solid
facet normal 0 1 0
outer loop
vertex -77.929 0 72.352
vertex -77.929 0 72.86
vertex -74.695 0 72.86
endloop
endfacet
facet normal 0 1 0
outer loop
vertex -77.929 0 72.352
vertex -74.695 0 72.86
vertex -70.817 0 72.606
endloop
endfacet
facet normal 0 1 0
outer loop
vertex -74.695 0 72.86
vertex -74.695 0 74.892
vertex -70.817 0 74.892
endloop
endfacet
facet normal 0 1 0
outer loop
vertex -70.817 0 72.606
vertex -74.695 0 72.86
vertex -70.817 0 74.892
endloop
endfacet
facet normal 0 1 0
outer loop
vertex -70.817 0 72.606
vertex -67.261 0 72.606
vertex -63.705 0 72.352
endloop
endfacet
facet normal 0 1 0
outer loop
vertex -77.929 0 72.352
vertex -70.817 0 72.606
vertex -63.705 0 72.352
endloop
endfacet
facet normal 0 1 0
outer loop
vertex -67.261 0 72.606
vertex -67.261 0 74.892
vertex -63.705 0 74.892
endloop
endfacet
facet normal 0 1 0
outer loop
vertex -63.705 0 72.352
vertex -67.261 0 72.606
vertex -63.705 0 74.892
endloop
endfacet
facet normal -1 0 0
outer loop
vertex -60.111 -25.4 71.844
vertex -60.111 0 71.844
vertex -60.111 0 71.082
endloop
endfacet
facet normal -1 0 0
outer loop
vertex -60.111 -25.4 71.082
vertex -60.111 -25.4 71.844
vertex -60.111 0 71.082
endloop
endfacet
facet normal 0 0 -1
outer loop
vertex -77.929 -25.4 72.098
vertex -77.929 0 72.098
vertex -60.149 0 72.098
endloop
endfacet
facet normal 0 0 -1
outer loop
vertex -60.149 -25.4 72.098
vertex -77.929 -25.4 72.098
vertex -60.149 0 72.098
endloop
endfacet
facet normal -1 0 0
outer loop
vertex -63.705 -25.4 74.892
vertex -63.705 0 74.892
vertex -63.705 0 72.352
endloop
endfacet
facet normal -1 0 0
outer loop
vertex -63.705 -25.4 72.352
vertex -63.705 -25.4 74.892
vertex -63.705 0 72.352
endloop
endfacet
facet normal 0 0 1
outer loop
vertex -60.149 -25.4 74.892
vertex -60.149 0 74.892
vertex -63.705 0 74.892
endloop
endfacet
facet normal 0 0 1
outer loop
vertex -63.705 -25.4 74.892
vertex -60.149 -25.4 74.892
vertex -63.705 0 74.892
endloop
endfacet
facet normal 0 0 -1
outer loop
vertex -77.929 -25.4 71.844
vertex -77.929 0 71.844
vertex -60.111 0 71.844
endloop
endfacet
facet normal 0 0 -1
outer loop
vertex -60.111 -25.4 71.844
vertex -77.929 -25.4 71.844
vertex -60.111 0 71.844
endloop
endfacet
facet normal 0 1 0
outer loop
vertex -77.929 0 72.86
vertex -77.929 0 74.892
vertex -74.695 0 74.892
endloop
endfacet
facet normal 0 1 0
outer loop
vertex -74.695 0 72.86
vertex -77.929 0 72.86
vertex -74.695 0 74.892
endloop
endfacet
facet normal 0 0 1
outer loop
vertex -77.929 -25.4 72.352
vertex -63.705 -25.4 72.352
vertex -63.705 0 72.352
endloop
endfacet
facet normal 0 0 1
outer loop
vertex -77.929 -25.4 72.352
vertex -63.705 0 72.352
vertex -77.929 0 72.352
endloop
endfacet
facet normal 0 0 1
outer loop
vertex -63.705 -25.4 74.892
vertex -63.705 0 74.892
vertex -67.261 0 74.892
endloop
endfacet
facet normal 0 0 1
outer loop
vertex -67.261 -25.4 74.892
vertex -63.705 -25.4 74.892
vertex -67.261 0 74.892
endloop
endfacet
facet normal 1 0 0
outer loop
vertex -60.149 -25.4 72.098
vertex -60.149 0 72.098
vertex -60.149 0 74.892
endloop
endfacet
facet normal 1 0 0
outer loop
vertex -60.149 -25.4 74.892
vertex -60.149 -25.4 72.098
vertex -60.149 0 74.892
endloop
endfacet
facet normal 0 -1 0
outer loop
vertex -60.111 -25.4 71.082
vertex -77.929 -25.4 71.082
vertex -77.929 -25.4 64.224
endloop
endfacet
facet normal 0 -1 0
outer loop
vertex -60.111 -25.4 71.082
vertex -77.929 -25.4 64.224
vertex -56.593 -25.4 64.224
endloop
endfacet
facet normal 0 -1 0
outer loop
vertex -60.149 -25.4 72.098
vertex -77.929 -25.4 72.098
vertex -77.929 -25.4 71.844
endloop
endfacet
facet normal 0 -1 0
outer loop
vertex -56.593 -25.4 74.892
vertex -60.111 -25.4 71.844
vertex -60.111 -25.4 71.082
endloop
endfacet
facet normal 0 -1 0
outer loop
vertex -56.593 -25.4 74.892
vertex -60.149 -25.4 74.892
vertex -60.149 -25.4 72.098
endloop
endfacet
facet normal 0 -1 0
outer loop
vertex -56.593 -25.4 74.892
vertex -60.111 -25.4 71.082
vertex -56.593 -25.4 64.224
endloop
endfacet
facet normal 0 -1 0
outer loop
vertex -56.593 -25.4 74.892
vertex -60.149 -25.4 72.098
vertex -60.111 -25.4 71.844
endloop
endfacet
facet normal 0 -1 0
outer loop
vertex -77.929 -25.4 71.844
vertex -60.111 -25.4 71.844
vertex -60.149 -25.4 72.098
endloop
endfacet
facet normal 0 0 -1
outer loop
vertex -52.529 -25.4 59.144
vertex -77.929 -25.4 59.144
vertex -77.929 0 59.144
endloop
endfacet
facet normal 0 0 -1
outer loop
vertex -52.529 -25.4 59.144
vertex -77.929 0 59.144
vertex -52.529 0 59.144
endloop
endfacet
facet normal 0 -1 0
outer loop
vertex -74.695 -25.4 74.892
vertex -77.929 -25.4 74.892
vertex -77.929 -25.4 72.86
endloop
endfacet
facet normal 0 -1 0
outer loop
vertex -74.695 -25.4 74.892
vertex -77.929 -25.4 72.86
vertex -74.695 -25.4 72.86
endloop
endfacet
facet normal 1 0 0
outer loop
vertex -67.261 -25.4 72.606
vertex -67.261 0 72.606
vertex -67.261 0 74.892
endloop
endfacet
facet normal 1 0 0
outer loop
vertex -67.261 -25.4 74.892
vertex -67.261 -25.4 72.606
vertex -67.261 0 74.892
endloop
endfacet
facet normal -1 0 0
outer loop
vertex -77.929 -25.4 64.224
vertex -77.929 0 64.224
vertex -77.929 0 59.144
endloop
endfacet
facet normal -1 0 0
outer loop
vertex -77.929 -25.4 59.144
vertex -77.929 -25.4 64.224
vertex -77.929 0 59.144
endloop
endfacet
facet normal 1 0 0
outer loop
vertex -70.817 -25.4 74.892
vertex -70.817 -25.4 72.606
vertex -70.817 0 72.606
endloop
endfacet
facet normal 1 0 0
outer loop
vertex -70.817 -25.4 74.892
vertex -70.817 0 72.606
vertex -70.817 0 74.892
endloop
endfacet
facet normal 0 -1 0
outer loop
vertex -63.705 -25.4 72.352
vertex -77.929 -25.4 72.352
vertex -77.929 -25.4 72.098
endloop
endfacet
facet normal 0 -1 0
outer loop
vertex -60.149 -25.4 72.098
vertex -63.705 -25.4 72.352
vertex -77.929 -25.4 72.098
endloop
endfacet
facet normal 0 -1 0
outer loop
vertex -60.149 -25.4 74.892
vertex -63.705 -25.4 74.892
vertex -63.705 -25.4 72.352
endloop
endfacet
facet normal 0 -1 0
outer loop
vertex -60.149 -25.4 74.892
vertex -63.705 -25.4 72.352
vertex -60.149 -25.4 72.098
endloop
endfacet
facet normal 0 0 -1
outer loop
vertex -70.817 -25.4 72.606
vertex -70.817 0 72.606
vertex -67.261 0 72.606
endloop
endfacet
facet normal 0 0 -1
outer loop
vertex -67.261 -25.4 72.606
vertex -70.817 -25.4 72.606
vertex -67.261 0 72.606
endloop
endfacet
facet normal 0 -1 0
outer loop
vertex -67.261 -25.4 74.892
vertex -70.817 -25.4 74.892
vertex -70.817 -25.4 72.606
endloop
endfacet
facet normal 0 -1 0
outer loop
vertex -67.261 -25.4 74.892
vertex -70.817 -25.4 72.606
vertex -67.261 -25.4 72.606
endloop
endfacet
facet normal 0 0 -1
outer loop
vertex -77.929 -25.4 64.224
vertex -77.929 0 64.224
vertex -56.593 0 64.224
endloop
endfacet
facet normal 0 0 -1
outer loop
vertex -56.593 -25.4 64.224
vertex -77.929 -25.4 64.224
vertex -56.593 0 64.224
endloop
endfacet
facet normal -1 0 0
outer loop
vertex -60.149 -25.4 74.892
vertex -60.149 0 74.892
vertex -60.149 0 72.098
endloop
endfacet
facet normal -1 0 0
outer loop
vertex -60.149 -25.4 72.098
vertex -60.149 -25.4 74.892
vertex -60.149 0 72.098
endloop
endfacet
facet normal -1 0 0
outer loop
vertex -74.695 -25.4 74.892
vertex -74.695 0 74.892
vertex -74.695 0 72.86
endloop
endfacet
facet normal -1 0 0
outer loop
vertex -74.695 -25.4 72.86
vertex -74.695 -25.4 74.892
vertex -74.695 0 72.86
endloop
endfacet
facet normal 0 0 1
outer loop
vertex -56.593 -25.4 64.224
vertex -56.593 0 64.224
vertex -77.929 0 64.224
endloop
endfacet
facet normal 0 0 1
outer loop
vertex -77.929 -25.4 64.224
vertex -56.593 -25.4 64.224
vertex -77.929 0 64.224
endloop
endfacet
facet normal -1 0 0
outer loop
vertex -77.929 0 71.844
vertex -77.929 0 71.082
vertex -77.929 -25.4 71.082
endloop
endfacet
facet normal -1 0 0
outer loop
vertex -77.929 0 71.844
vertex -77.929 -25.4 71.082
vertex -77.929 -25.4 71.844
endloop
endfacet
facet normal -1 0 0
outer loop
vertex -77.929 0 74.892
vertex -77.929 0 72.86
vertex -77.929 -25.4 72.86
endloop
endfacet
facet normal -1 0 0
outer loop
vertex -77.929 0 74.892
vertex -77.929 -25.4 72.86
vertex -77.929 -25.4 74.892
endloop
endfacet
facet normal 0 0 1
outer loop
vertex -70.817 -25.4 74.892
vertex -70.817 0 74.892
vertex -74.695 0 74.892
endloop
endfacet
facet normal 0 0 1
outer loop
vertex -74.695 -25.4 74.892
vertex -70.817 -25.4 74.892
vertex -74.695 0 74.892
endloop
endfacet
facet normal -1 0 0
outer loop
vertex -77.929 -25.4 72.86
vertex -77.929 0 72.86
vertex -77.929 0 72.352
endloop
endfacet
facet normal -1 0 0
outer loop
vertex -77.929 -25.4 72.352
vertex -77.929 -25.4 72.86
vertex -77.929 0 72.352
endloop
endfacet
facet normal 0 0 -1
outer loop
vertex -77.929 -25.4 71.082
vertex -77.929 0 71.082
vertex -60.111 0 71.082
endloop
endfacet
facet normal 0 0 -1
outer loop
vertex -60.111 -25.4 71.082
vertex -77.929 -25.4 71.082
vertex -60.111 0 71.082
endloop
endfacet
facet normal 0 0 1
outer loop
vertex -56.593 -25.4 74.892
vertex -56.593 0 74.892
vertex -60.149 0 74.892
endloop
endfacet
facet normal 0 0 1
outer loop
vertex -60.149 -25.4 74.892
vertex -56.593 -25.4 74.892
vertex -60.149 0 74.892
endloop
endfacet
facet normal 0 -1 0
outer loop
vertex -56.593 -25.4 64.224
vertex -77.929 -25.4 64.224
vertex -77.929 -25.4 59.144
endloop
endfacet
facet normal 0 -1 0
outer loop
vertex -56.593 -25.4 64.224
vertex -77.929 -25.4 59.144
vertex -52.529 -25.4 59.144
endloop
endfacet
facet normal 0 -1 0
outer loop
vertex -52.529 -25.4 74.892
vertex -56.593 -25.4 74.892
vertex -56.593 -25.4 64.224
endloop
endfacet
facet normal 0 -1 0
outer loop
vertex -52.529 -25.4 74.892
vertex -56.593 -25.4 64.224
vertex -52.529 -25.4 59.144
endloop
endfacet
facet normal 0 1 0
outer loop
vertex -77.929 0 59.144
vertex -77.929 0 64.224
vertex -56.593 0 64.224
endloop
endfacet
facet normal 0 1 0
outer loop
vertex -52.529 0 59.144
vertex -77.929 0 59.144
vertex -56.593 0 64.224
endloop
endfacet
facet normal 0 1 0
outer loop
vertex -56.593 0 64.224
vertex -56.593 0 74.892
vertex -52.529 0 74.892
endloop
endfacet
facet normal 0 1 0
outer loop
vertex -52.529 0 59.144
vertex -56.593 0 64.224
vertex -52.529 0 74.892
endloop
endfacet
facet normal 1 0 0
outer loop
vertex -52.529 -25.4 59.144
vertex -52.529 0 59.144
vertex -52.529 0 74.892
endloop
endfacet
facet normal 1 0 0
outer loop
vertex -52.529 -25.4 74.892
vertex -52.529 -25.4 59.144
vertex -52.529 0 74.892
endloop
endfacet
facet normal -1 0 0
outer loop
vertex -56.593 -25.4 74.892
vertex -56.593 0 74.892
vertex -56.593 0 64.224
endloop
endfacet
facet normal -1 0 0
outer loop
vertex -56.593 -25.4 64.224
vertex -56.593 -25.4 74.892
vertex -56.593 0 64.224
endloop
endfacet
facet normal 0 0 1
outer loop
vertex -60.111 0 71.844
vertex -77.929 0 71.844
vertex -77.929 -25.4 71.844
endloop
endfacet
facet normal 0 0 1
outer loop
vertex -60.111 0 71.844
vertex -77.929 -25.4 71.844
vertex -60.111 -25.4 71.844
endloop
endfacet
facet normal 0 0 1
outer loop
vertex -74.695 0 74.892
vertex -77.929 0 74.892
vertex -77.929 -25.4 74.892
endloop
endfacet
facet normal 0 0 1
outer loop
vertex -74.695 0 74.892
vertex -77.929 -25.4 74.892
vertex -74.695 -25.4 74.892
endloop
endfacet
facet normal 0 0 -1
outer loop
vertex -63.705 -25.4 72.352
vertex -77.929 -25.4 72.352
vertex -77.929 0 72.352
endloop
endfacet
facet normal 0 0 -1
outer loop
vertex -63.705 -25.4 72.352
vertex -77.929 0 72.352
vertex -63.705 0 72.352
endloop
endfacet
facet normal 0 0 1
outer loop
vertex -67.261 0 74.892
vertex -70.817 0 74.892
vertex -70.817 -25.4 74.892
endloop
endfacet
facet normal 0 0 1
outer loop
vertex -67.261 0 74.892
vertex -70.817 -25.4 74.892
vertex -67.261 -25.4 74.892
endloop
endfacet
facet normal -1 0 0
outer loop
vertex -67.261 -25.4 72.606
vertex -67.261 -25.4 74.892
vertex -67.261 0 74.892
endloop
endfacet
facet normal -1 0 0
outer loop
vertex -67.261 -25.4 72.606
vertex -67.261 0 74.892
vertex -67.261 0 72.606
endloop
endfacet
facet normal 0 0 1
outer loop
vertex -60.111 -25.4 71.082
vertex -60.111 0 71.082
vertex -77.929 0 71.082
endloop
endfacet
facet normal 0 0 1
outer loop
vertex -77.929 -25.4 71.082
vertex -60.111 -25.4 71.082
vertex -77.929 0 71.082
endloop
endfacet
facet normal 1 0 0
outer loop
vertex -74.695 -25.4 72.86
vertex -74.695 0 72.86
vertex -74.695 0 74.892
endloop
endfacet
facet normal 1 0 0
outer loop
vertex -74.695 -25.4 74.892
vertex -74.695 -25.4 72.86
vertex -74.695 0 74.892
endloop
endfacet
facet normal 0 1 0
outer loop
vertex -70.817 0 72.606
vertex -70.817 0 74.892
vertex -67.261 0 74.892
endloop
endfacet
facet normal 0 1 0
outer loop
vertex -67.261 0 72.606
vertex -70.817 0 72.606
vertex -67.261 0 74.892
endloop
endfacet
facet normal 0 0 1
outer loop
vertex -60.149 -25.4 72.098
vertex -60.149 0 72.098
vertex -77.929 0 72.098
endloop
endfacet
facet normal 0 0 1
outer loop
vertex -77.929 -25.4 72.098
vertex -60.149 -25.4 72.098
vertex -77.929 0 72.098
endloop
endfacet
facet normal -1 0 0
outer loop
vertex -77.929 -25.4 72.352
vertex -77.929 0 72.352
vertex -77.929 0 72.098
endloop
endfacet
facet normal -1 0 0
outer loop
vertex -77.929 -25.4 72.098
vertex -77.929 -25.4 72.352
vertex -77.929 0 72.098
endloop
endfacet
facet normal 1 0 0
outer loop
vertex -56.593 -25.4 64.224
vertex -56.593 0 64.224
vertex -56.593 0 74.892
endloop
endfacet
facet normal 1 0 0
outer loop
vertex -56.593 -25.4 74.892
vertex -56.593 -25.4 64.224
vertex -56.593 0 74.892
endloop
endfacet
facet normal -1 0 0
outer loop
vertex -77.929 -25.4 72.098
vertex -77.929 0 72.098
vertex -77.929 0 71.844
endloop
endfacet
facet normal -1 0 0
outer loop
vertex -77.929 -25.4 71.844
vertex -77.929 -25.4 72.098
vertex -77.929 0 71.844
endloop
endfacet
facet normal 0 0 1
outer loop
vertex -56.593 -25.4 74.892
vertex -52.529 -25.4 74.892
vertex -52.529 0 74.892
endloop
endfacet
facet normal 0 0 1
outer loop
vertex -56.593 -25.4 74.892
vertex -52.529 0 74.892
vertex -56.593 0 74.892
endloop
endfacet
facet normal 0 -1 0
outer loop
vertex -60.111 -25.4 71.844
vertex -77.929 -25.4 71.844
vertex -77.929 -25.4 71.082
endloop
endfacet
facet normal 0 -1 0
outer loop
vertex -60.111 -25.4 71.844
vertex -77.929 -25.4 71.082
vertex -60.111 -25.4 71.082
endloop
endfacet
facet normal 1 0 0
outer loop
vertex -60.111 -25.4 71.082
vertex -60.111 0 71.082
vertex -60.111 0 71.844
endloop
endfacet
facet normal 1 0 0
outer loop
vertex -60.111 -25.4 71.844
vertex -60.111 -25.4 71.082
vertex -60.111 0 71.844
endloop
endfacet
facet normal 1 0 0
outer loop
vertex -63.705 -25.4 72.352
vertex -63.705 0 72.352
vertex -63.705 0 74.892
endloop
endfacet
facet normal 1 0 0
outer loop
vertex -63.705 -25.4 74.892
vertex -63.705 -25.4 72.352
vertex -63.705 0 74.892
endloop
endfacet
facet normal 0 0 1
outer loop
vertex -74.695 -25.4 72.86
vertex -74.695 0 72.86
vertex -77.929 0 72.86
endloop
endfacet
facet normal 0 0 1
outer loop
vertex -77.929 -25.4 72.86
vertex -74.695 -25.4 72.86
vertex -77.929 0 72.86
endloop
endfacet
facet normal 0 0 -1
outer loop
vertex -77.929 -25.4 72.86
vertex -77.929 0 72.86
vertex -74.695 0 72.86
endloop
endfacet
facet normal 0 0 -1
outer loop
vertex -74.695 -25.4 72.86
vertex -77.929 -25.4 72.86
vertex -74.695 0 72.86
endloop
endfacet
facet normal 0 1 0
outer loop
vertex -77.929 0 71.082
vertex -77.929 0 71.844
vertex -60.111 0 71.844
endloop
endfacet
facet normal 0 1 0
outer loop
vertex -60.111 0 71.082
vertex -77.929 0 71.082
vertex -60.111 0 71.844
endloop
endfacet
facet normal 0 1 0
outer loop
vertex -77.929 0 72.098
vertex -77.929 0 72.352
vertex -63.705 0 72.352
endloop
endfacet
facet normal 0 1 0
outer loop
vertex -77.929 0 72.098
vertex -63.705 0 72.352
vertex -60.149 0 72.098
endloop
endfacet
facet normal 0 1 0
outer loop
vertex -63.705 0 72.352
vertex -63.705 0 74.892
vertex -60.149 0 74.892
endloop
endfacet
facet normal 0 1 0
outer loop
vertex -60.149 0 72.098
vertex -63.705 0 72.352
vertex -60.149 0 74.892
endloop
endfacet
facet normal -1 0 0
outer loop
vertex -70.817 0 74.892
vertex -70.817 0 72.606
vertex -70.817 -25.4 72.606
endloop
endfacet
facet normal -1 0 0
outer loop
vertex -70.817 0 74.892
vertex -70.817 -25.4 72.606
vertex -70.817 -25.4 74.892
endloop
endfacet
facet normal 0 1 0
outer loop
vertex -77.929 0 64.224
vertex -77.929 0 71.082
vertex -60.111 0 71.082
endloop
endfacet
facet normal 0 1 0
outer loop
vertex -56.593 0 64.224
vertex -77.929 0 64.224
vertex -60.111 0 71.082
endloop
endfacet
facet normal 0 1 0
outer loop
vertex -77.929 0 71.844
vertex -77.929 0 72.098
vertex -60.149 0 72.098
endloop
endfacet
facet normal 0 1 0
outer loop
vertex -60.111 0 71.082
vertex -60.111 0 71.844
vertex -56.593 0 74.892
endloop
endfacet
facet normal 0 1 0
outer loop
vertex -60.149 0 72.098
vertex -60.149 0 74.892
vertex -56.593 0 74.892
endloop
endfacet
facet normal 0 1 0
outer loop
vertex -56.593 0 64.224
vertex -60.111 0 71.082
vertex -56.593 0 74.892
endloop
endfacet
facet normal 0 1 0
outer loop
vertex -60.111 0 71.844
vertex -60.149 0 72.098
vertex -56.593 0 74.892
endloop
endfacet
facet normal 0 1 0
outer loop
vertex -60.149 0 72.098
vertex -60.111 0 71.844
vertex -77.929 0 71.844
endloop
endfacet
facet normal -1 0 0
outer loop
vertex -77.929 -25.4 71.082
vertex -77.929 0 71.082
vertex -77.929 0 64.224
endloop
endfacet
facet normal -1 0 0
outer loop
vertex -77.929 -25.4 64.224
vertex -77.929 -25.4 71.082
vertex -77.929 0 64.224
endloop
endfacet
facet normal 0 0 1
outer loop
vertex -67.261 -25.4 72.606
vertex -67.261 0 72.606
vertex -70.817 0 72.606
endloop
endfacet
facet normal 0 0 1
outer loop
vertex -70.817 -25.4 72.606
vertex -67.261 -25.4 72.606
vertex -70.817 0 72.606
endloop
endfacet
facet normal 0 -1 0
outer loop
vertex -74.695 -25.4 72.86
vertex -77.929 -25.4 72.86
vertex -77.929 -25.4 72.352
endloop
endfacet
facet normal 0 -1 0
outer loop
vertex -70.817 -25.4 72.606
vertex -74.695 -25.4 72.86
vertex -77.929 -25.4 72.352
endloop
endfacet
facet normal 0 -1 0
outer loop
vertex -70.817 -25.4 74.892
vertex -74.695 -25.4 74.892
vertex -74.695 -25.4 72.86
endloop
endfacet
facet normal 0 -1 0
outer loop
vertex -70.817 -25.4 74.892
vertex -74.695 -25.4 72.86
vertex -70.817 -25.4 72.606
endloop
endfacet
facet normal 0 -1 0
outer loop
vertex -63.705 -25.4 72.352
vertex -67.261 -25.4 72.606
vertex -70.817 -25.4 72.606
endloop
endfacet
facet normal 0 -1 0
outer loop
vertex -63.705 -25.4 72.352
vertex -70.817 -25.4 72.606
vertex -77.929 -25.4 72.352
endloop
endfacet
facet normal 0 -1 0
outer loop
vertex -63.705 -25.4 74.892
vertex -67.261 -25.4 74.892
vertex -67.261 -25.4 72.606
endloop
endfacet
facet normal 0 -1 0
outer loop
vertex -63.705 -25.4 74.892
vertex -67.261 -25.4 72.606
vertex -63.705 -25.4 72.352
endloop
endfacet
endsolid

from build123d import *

# Parameters (mm, degrees)
F0_W     = 3.2343588114
F0_H     = 2.032
F1_DEPTH = 25.4
F0_W_2   = 3.556
F0_H_2   = 2.286
F0_W_3   = 17.8182184041
F0_H_3   = 0.762
F2_DEPTH = 25.4
F3_DEPTH = 25.4


with BuildPart() as f1:
    # F0 (on Front) → F1 (new body)
    with BuildSketch(Plane.XZ):
        with Locations((-76.3119991541, 73.876333005)):
            Rectangle(F0_W, F0_H)
    extrude(amount=F1_DEPTH)


with BuildPart() as f1b:
    # F0 (on Front) → F1, piece 2 (new body)
    with BuildSketch(Plane.XZ):
        with Locations((-69.0391785598, 73.749333005)):
            Rectangle(F0_W_2, F0_H_2)
    extrude(amount=F1_DEPTH)


with BuildPart() as f1c:
    # F0 (on Front) → F1, piece 3 (new body)
    with BuildSketch(Plane.XZ):
        Polygon((-63.7051785598, 72.352333005), (-77.9291785598, 72.352333005), (-77.9291785598, 72.098333005), (-60.1491785598, 72.098333005), (-60.1491785598, 74.892333005), (-63.7051785598, 74.892333005), align=None)
    extrude(amount=F1_DEPTH)


with BuildPart() as f1d:
    # F0 (on Front) → F1, piece 4 (new body)
    with BuildSketch(Plane.XZ):
        with Locations((-69.0200693578, 71.463333005)):
            Rectangle(F0_W_3, F0_H_3)
    extrude(amount=F1_DEPTH)


with BuildPart() as f1e:
    # F0 (on Front) → F1, piece 5 (new body)
    with BuildSketch(Plane.XZ):
        Polygon((-52.5291785598, 74.892333005), (-56.5931785598, 74.892333005), (-56.5931785598, 64.224333005), (-77.9291785598, 64.224333005), (-77.9291785598, 59.144333005), (-74.3731785598, 59.144333005), (-70.8171785598, 59.144333005), (-67.2611785598, 59.144333005), (-63.7051785598, 59.144333005), (-60.1491785598, 59.144333005), (-56.5931785598, 59.144333005), (-52.5291785598, 59.144333005), align=None)
    extrude(amount=F1_DEPTH)


with BuildPart() as f2:
    # F0 (on Front) → F2 (new body)
    with BuildSketch(Plane.XZ):
        Polygon((-70.8171785598, 74.892333005), (-74.6948197484, 74.892333005), (-74.6948197484, 72.860333005), (-77.9291785598, 72.860333005), (-77.9291785598, 72.606333005), (-70.8171785598, 72.606333005), align=None)
        Polygon((-70.8171785598, 72.606333005), (-77.9291785598, 72.606333005), (-77.9291785598, 72.352333005), (-63.7051785598, 72.352333005), (-63.7051785598, 74.892333005), (-67.2611785598, 74.892333005), (-67.2611785598, 72.606333005), align=None)
    extrude(amount=F2_DEPTH)


with BuildPart() as f3:
    # F0 (on Front) → F3 (new body)
    with BuildSketch(Plane.XZ):
        Polygon((-60.1491785598, 72.098333005), (-77.9291785598, 72.098333005), (-77.9291785598, 71.844333005), (-60.1109601557, 71.844333005), (-60.1109601557, 71.082333005), (-77.9291785598, 71.082333005), (-77.9291785598, 64.224333005), (-56.5931785598, 64.224333005), (-56.5931785598, 74.892333005), (-60.1491785598, 74.892333005), align=None)
    extrude(amount=F3_DEPTH)


solid = Compound([f1.part, f1b.part, f1c.part, f1d.part, f1e.part, f2.part, f3.part])
